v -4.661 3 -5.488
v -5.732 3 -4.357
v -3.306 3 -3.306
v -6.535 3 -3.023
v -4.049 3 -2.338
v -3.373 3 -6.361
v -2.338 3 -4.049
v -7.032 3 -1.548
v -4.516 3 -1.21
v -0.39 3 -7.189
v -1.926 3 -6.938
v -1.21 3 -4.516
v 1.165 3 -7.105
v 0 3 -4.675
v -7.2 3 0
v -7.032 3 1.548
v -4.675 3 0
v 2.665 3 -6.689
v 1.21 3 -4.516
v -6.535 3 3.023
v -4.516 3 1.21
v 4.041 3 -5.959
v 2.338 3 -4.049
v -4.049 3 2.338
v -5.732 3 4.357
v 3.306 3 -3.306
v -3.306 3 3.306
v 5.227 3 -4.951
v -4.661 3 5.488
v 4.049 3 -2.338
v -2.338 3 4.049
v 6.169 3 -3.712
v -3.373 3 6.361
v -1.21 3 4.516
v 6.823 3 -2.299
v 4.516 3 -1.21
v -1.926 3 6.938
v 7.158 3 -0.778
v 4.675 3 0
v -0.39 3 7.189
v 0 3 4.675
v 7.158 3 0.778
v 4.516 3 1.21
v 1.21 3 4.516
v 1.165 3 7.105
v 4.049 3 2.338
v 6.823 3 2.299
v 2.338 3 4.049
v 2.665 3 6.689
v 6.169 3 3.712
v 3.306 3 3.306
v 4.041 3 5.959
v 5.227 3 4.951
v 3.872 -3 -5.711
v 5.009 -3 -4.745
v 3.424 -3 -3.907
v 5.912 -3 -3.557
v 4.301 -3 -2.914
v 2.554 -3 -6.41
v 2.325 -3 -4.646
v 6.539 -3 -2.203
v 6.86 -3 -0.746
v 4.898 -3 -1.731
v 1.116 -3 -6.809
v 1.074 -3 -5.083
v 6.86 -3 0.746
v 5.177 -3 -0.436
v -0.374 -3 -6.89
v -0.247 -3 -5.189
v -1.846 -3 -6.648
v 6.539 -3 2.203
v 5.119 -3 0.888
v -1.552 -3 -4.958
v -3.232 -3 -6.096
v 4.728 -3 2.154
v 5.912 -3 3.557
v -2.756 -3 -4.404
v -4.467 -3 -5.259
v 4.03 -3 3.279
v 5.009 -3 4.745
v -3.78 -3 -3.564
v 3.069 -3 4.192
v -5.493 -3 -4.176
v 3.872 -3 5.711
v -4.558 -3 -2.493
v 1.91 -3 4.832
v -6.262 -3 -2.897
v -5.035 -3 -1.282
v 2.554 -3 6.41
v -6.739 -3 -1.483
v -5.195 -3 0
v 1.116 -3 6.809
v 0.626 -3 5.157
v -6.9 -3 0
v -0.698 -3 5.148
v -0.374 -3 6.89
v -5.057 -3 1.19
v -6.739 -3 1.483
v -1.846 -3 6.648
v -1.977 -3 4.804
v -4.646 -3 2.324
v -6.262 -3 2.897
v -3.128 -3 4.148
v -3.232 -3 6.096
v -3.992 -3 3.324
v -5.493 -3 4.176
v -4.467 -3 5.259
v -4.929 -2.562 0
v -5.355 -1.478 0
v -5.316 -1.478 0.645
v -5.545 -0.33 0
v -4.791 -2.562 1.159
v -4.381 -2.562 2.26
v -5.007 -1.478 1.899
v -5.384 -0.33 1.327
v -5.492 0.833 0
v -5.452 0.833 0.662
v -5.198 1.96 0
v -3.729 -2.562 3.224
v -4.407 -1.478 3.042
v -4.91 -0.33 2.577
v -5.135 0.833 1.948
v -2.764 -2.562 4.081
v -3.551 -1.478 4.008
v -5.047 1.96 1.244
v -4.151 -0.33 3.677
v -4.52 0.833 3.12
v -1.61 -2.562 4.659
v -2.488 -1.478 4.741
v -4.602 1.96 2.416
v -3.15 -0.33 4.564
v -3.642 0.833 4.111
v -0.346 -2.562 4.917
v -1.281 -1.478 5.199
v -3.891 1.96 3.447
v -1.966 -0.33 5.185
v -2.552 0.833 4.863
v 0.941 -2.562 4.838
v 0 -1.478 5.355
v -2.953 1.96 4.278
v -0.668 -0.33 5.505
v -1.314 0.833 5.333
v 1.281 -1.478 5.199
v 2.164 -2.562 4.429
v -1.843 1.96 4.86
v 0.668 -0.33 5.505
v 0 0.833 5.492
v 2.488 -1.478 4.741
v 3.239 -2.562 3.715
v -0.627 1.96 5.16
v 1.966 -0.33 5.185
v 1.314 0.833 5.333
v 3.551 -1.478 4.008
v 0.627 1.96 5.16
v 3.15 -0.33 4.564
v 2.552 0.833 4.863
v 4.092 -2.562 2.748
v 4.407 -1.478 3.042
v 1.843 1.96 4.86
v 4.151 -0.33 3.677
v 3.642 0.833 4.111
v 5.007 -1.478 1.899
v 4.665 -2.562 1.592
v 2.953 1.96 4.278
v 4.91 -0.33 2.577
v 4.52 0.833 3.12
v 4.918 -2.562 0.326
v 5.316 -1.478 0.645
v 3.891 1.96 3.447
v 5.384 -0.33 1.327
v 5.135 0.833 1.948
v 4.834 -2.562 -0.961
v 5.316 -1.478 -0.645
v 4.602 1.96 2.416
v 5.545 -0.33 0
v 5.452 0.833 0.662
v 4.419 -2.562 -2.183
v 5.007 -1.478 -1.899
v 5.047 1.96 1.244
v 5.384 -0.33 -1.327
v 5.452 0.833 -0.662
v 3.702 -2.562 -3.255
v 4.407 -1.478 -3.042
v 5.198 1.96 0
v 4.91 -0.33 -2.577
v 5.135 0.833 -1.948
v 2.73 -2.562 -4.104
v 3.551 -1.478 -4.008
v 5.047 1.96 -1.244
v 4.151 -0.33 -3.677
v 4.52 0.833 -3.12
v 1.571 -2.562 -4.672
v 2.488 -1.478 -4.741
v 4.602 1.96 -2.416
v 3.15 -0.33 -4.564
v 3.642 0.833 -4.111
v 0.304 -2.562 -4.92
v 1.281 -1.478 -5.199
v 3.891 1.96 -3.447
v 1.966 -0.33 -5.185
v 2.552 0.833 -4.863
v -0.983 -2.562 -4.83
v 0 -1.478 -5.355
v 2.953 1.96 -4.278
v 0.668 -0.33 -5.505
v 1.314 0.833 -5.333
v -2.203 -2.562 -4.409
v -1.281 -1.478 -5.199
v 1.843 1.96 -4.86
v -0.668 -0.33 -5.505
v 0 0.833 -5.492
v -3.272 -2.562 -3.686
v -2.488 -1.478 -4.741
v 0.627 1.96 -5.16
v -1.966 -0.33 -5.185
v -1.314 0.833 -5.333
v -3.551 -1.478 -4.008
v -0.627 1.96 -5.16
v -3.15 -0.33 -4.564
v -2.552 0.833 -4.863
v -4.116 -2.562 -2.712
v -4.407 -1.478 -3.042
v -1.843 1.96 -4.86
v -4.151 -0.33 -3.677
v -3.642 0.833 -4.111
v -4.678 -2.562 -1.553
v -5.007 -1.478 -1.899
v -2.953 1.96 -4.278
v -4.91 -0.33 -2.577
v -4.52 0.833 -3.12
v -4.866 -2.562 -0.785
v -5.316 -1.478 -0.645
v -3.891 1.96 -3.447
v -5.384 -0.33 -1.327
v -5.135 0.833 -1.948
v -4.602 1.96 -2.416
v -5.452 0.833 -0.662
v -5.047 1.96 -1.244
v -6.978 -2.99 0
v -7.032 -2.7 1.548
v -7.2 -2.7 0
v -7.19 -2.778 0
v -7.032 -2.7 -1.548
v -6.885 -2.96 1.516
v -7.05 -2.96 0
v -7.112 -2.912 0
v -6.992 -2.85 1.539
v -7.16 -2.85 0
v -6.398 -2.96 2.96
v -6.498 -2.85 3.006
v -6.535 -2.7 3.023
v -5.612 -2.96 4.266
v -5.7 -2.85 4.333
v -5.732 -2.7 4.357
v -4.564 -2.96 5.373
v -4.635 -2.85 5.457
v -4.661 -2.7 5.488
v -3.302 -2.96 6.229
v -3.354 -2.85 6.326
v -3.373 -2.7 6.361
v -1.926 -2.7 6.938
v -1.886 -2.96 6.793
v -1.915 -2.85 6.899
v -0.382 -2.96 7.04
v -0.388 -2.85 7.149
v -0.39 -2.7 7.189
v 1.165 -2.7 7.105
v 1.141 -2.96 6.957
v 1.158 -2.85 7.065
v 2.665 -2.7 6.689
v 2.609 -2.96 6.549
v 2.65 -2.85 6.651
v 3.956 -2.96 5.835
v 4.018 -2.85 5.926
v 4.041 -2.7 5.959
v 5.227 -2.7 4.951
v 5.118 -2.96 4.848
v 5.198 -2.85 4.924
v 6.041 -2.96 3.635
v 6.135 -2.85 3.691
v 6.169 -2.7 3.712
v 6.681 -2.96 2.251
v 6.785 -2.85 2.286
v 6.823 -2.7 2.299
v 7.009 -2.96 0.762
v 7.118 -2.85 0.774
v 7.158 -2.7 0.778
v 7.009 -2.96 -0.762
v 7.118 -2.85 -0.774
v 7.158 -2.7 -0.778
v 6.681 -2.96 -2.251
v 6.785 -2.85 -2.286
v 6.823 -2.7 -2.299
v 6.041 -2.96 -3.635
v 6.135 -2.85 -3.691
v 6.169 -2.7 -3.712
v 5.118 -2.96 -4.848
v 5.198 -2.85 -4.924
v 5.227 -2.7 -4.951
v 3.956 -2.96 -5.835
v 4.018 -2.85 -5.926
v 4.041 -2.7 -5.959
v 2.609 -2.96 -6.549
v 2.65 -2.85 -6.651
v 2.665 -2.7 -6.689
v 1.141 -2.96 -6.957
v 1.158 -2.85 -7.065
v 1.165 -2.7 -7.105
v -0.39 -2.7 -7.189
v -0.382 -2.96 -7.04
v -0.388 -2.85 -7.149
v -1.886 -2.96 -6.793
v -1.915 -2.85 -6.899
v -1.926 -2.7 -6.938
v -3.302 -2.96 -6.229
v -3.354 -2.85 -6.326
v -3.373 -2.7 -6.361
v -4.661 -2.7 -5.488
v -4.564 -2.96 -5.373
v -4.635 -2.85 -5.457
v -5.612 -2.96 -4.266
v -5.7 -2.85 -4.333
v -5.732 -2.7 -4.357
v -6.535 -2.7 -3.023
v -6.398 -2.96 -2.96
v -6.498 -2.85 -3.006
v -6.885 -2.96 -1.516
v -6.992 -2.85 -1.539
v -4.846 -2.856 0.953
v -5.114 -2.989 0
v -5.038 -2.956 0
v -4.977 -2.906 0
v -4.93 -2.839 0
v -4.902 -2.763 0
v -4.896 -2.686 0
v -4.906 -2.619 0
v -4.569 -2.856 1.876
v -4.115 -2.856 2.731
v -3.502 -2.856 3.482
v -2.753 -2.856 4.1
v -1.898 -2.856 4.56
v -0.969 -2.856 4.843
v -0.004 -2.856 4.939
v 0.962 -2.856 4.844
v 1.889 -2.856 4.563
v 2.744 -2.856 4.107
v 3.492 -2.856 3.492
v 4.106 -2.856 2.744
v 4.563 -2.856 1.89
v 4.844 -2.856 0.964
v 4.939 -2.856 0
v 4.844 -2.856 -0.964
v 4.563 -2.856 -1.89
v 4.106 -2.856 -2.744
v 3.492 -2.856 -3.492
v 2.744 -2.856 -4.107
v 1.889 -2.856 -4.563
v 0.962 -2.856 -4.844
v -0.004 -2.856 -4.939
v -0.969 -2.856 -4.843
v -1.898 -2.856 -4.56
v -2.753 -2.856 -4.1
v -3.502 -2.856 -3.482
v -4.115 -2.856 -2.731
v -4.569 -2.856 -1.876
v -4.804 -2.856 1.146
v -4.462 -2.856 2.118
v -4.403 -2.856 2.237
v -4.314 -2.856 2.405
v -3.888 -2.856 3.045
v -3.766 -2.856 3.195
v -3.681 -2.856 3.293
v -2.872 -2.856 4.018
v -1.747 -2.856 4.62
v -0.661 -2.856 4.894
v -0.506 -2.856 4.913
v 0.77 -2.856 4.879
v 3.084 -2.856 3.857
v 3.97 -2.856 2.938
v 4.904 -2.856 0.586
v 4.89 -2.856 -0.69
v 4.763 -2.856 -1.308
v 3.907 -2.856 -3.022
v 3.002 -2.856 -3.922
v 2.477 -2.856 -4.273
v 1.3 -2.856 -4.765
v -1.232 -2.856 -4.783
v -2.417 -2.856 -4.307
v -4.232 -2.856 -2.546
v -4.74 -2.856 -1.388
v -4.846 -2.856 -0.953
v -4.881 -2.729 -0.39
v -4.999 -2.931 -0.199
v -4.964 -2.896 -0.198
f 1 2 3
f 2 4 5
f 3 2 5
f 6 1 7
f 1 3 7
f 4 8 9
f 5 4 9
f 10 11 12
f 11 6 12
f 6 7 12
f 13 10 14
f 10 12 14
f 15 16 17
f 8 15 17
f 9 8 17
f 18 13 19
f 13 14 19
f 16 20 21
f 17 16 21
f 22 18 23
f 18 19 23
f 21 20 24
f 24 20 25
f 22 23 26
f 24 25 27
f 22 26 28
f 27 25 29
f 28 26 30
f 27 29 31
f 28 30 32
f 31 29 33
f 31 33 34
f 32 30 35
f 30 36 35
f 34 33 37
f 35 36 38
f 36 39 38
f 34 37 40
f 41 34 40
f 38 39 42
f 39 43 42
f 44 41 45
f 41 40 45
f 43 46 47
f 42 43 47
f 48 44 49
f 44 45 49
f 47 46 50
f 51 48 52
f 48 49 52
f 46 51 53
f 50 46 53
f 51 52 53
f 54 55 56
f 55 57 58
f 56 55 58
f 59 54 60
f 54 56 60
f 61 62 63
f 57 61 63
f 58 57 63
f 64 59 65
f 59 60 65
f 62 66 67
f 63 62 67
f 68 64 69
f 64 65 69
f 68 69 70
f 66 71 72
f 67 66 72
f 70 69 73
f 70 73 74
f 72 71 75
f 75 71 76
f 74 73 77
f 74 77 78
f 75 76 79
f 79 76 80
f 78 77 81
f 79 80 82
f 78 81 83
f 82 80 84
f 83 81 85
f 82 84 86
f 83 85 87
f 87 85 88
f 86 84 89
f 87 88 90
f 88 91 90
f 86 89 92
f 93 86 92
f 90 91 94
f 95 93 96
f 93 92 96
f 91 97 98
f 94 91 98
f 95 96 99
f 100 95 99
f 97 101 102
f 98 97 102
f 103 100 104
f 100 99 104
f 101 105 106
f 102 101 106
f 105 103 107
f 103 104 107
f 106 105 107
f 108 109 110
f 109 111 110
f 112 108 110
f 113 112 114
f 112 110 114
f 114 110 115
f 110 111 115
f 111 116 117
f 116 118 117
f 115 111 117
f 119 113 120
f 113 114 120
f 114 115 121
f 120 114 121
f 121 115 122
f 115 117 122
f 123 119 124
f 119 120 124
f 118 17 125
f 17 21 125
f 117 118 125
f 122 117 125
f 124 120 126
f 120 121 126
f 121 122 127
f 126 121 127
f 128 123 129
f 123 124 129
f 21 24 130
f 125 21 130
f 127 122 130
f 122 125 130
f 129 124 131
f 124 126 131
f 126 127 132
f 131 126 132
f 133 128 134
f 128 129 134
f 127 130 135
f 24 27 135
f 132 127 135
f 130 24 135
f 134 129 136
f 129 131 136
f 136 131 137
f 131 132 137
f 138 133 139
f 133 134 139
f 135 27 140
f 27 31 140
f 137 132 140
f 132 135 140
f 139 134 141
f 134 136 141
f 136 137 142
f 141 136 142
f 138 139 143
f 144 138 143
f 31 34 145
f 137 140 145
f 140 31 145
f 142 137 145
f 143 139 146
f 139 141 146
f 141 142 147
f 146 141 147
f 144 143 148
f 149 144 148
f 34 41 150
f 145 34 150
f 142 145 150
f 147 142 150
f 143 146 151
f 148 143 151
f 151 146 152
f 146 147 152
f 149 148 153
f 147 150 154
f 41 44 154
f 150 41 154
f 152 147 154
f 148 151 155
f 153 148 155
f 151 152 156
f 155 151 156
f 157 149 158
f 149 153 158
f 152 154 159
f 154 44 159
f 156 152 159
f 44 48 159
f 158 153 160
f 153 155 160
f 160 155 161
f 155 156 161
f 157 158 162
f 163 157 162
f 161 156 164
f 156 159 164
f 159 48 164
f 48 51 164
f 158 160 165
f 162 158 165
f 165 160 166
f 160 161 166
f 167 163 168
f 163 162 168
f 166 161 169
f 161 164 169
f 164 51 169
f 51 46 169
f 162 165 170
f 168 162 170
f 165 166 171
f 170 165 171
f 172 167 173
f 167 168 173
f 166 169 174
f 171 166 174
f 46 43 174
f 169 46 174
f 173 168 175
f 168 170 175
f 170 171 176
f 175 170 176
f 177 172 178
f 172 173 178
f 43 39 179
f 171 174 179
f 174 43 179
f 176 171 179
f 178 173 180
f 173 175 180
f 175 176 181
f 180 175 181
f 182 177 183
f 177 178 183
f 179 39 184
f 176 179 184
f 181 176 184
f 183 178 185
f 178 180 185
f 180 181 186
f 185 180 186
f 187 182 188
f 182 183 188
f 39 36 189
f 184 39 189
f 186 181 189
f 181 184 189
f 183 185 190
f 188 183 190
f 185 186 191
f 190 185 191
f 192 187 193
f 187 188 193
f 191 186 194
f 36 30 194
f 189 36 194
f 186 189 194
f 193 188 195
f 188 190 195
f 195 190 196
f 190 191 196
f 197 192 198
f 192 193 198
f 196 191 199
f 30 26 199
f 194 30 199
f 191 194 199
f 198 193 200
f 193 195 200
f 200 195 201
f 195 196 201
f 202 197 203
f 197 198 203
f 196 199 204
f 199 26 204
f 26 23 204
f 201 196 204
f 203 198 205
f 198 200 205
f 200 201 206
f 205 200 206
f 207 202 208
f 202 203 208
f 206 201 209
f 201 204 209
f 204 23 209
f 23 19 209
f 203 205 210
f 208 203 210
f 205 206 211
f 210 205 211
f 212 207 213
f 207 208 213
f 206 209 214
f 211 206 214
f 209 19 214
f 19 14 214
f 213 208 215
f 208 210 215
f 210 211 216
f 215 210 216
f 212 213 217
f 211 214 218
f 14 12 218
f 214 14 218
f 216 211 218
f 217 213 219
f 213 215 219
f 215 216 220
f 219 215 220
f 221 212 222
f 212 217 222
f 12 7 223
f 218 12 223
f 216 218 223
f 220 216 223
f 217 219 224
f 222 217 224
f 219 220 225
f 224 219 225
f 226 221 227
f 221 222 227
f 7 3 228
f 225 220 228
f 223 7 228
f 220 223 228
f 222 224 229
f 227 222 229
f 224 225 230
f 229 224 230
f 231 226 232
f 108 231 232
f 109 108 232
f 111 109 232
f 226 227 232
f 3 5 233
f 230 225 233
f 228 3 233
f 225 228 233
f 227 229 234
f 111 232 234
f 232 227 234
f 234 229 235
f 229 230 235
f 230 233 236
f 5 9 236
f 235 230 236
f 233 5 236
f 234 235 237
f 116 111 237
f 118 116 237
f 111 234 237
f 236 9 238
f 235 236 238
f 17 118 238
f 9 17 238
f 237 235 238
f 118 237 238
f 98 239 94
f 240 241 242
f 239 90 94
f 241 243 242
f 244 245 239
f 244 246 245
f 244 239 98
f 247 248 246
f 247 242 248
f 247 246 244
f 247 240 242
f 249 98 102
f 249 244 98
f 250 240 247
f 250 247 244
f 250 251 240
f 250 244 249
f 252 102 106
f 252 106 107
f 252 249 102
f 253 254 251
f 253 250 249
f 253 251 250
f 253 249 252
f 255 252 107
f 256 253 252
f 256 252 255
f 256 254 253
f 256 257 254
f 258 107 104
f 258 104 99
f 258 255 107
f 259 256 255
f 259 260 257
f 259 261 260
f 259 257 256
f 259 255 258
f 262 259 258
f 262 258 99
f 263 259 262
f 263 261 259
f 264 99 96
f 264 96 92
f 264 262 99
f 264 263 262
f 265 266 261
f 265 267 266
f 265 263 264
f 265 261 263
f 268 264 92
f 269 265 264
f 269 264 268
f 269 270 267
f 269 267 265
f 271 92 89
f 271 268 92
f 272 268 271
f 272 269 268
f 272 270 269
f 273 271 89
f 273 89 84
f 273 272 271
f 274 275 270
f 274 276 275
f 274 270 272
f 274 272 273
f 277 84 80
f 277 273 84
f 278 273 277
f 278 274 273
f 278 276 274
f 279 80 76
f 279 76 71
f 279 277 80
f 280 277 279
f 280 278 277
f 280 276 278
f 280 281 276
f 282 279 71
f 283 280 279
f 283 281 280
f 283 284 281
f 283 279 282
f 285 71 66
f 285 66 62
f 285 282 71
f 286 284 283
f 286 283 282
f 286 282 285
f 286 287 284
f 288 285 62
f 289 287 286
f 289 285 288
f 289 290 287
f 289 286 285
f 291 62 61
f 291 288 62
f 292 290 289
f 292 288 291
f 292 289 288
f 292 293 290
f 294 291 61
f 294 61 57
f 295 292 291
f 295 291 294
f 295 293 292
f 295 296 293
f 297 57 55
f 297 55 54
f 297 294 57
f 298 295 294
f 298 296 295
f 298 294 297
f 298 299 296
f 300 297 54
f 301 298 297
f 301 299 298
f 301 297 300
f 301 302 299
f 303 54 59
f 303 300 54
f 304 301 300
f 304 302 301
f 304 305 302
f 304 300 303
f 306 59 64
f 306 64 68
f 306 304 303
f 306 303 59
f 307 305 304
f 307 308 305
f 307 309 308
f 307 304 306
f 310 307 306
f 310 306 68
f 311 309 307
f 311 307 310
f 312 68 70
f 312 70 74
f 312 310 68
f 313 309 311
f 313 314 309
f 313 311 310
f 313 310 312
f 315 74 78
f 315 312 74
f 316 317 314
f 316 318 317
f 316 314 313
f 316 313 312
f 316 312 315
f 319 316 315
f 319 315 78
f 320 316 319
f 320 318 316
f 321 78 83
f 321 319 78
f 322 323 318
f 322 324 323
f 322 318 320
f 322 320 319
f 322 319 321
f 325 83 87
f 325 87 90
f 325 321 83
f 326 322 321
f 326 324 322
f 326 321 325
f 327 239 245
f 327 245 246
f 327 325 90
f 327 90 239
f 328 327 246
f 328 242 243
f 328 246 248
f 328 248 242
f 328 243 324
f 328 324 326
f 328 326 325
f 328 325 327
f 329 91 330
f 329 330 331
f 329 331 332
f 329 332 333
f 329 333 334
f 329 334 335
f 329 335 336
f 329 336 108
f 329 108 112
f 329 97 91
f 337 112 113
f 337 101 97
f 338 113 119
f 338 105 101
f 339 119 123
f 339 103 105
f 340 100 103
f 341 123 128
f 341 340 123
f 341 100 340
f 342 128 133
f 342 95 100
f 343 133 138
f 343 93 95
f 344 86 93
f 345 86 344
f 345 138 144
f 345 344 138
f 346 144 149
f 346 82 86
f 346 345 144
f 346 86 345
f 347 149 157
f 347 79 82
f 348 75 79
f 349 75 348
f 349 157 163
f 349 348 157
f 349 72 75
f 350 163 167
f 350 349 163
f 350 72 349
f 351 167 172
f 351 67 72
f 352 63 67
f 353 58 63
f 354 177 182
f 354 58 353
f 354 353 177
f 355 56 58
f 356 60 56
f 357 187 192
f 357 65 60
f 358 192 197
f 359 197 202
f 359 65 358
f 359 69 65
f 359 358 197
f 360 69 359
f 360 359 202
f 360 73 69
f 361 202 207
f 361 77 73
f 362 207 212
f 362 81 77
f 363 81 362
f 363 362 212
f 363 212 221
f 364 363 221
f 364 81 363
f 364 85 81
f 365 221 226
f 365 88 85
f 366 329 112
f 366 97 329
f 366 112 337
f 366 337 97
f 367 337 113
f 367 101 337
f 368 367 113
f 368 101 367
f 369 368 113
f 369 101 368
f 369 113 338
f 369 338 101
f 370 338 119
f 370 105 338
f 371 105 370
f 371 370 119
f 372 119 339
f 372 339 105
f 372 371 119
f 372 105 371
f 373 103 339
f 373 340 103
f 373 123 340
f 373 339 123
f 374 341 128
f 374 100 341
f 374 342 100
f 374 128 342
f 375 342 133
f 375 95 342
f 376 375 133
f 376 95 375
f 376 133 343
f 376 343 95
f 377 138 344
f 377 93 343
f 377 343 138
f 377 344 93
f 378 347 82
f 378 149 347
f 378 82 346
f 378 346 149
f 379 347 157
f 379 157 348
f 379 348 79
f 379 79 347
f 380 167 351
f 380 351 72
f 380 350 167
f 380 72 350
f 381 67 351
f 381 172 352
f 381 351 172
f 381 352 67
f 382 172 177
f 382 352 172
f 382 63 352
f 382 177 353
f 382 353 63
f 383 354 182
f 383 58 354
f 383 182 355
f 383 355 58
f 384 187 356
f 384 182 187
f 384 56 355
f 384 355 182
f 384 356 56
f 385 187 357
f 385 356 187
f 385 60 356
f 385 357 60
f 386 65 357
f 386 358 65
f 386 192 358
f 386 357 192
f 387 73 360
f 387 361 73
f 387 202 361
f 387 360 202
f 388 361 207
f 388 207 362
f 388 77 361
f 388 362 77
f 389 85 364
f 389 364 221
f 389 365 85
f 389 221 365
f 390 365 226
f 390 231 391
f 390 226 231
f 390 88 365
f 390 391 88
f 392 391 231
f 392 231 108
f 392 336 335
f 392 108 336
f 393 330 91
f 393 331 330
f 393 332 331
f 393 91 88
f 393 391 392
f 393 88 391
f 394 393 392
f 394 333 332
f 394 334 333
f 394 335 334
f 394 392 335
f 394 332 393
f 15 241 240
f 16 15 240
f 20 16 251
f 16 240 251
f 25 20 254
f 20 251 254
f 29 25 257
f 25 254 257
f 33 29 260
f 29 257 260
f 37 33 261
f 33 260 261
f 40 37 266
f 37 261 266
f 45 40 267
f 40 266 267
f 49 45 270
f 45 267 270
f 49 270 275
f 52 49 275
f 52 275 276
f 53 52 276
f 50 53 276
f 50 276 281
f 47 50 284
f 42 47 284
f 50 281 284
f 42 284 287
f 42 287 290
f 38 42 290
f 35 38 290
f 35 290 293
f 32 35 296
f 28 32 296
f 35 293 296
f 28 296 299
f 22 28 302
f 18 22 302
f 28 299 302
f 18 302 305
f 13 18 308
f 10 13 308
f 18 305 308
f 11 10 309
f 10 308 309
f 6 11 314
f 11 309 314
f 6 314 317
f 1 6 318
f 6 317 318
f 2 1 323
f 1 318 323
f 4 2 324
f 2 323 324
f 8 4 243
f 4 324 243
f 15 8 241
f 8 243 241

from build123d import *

# Parameters (mm, degrees)
FILLET1_R = 0.3
FILLET2_R = 0.3


with BuildPart() as part:
    # Sketch1 → Revolve1 (revolve)
    with BuildSketch(Plane.XY):
        with BuildLine():
            Line((-4.675256677, 3), (-7.2, 3))
            Line((-7.2, 3), (-7.2, -3))
            Line((-7.2, -3), (-4.675256677, -3))
            ThreePointArc((-4.675256677, -3), (-5.555, 0), (-4.675256677, 3))
        make_face()
    revolve(axis=Axis((0, -3.809768202, 0), (0, 1, 0)))

    # Fillet1
    fillet1_edges = [part.edges().sort_by_distance(p)[0] for p in [
        (4.675256677, -3, 0),
    ]]
    fillet(fillet1_edges, radius=FILLET1_R)

    # Fillet2
    fillet2_edges = [part.edges().sort_by_distance(p)[0] for p in [
        (7.2, -3, 0),
    ]]
    fillet(fillet2_edges, radius=FILLET2_R)


solid = part.part
